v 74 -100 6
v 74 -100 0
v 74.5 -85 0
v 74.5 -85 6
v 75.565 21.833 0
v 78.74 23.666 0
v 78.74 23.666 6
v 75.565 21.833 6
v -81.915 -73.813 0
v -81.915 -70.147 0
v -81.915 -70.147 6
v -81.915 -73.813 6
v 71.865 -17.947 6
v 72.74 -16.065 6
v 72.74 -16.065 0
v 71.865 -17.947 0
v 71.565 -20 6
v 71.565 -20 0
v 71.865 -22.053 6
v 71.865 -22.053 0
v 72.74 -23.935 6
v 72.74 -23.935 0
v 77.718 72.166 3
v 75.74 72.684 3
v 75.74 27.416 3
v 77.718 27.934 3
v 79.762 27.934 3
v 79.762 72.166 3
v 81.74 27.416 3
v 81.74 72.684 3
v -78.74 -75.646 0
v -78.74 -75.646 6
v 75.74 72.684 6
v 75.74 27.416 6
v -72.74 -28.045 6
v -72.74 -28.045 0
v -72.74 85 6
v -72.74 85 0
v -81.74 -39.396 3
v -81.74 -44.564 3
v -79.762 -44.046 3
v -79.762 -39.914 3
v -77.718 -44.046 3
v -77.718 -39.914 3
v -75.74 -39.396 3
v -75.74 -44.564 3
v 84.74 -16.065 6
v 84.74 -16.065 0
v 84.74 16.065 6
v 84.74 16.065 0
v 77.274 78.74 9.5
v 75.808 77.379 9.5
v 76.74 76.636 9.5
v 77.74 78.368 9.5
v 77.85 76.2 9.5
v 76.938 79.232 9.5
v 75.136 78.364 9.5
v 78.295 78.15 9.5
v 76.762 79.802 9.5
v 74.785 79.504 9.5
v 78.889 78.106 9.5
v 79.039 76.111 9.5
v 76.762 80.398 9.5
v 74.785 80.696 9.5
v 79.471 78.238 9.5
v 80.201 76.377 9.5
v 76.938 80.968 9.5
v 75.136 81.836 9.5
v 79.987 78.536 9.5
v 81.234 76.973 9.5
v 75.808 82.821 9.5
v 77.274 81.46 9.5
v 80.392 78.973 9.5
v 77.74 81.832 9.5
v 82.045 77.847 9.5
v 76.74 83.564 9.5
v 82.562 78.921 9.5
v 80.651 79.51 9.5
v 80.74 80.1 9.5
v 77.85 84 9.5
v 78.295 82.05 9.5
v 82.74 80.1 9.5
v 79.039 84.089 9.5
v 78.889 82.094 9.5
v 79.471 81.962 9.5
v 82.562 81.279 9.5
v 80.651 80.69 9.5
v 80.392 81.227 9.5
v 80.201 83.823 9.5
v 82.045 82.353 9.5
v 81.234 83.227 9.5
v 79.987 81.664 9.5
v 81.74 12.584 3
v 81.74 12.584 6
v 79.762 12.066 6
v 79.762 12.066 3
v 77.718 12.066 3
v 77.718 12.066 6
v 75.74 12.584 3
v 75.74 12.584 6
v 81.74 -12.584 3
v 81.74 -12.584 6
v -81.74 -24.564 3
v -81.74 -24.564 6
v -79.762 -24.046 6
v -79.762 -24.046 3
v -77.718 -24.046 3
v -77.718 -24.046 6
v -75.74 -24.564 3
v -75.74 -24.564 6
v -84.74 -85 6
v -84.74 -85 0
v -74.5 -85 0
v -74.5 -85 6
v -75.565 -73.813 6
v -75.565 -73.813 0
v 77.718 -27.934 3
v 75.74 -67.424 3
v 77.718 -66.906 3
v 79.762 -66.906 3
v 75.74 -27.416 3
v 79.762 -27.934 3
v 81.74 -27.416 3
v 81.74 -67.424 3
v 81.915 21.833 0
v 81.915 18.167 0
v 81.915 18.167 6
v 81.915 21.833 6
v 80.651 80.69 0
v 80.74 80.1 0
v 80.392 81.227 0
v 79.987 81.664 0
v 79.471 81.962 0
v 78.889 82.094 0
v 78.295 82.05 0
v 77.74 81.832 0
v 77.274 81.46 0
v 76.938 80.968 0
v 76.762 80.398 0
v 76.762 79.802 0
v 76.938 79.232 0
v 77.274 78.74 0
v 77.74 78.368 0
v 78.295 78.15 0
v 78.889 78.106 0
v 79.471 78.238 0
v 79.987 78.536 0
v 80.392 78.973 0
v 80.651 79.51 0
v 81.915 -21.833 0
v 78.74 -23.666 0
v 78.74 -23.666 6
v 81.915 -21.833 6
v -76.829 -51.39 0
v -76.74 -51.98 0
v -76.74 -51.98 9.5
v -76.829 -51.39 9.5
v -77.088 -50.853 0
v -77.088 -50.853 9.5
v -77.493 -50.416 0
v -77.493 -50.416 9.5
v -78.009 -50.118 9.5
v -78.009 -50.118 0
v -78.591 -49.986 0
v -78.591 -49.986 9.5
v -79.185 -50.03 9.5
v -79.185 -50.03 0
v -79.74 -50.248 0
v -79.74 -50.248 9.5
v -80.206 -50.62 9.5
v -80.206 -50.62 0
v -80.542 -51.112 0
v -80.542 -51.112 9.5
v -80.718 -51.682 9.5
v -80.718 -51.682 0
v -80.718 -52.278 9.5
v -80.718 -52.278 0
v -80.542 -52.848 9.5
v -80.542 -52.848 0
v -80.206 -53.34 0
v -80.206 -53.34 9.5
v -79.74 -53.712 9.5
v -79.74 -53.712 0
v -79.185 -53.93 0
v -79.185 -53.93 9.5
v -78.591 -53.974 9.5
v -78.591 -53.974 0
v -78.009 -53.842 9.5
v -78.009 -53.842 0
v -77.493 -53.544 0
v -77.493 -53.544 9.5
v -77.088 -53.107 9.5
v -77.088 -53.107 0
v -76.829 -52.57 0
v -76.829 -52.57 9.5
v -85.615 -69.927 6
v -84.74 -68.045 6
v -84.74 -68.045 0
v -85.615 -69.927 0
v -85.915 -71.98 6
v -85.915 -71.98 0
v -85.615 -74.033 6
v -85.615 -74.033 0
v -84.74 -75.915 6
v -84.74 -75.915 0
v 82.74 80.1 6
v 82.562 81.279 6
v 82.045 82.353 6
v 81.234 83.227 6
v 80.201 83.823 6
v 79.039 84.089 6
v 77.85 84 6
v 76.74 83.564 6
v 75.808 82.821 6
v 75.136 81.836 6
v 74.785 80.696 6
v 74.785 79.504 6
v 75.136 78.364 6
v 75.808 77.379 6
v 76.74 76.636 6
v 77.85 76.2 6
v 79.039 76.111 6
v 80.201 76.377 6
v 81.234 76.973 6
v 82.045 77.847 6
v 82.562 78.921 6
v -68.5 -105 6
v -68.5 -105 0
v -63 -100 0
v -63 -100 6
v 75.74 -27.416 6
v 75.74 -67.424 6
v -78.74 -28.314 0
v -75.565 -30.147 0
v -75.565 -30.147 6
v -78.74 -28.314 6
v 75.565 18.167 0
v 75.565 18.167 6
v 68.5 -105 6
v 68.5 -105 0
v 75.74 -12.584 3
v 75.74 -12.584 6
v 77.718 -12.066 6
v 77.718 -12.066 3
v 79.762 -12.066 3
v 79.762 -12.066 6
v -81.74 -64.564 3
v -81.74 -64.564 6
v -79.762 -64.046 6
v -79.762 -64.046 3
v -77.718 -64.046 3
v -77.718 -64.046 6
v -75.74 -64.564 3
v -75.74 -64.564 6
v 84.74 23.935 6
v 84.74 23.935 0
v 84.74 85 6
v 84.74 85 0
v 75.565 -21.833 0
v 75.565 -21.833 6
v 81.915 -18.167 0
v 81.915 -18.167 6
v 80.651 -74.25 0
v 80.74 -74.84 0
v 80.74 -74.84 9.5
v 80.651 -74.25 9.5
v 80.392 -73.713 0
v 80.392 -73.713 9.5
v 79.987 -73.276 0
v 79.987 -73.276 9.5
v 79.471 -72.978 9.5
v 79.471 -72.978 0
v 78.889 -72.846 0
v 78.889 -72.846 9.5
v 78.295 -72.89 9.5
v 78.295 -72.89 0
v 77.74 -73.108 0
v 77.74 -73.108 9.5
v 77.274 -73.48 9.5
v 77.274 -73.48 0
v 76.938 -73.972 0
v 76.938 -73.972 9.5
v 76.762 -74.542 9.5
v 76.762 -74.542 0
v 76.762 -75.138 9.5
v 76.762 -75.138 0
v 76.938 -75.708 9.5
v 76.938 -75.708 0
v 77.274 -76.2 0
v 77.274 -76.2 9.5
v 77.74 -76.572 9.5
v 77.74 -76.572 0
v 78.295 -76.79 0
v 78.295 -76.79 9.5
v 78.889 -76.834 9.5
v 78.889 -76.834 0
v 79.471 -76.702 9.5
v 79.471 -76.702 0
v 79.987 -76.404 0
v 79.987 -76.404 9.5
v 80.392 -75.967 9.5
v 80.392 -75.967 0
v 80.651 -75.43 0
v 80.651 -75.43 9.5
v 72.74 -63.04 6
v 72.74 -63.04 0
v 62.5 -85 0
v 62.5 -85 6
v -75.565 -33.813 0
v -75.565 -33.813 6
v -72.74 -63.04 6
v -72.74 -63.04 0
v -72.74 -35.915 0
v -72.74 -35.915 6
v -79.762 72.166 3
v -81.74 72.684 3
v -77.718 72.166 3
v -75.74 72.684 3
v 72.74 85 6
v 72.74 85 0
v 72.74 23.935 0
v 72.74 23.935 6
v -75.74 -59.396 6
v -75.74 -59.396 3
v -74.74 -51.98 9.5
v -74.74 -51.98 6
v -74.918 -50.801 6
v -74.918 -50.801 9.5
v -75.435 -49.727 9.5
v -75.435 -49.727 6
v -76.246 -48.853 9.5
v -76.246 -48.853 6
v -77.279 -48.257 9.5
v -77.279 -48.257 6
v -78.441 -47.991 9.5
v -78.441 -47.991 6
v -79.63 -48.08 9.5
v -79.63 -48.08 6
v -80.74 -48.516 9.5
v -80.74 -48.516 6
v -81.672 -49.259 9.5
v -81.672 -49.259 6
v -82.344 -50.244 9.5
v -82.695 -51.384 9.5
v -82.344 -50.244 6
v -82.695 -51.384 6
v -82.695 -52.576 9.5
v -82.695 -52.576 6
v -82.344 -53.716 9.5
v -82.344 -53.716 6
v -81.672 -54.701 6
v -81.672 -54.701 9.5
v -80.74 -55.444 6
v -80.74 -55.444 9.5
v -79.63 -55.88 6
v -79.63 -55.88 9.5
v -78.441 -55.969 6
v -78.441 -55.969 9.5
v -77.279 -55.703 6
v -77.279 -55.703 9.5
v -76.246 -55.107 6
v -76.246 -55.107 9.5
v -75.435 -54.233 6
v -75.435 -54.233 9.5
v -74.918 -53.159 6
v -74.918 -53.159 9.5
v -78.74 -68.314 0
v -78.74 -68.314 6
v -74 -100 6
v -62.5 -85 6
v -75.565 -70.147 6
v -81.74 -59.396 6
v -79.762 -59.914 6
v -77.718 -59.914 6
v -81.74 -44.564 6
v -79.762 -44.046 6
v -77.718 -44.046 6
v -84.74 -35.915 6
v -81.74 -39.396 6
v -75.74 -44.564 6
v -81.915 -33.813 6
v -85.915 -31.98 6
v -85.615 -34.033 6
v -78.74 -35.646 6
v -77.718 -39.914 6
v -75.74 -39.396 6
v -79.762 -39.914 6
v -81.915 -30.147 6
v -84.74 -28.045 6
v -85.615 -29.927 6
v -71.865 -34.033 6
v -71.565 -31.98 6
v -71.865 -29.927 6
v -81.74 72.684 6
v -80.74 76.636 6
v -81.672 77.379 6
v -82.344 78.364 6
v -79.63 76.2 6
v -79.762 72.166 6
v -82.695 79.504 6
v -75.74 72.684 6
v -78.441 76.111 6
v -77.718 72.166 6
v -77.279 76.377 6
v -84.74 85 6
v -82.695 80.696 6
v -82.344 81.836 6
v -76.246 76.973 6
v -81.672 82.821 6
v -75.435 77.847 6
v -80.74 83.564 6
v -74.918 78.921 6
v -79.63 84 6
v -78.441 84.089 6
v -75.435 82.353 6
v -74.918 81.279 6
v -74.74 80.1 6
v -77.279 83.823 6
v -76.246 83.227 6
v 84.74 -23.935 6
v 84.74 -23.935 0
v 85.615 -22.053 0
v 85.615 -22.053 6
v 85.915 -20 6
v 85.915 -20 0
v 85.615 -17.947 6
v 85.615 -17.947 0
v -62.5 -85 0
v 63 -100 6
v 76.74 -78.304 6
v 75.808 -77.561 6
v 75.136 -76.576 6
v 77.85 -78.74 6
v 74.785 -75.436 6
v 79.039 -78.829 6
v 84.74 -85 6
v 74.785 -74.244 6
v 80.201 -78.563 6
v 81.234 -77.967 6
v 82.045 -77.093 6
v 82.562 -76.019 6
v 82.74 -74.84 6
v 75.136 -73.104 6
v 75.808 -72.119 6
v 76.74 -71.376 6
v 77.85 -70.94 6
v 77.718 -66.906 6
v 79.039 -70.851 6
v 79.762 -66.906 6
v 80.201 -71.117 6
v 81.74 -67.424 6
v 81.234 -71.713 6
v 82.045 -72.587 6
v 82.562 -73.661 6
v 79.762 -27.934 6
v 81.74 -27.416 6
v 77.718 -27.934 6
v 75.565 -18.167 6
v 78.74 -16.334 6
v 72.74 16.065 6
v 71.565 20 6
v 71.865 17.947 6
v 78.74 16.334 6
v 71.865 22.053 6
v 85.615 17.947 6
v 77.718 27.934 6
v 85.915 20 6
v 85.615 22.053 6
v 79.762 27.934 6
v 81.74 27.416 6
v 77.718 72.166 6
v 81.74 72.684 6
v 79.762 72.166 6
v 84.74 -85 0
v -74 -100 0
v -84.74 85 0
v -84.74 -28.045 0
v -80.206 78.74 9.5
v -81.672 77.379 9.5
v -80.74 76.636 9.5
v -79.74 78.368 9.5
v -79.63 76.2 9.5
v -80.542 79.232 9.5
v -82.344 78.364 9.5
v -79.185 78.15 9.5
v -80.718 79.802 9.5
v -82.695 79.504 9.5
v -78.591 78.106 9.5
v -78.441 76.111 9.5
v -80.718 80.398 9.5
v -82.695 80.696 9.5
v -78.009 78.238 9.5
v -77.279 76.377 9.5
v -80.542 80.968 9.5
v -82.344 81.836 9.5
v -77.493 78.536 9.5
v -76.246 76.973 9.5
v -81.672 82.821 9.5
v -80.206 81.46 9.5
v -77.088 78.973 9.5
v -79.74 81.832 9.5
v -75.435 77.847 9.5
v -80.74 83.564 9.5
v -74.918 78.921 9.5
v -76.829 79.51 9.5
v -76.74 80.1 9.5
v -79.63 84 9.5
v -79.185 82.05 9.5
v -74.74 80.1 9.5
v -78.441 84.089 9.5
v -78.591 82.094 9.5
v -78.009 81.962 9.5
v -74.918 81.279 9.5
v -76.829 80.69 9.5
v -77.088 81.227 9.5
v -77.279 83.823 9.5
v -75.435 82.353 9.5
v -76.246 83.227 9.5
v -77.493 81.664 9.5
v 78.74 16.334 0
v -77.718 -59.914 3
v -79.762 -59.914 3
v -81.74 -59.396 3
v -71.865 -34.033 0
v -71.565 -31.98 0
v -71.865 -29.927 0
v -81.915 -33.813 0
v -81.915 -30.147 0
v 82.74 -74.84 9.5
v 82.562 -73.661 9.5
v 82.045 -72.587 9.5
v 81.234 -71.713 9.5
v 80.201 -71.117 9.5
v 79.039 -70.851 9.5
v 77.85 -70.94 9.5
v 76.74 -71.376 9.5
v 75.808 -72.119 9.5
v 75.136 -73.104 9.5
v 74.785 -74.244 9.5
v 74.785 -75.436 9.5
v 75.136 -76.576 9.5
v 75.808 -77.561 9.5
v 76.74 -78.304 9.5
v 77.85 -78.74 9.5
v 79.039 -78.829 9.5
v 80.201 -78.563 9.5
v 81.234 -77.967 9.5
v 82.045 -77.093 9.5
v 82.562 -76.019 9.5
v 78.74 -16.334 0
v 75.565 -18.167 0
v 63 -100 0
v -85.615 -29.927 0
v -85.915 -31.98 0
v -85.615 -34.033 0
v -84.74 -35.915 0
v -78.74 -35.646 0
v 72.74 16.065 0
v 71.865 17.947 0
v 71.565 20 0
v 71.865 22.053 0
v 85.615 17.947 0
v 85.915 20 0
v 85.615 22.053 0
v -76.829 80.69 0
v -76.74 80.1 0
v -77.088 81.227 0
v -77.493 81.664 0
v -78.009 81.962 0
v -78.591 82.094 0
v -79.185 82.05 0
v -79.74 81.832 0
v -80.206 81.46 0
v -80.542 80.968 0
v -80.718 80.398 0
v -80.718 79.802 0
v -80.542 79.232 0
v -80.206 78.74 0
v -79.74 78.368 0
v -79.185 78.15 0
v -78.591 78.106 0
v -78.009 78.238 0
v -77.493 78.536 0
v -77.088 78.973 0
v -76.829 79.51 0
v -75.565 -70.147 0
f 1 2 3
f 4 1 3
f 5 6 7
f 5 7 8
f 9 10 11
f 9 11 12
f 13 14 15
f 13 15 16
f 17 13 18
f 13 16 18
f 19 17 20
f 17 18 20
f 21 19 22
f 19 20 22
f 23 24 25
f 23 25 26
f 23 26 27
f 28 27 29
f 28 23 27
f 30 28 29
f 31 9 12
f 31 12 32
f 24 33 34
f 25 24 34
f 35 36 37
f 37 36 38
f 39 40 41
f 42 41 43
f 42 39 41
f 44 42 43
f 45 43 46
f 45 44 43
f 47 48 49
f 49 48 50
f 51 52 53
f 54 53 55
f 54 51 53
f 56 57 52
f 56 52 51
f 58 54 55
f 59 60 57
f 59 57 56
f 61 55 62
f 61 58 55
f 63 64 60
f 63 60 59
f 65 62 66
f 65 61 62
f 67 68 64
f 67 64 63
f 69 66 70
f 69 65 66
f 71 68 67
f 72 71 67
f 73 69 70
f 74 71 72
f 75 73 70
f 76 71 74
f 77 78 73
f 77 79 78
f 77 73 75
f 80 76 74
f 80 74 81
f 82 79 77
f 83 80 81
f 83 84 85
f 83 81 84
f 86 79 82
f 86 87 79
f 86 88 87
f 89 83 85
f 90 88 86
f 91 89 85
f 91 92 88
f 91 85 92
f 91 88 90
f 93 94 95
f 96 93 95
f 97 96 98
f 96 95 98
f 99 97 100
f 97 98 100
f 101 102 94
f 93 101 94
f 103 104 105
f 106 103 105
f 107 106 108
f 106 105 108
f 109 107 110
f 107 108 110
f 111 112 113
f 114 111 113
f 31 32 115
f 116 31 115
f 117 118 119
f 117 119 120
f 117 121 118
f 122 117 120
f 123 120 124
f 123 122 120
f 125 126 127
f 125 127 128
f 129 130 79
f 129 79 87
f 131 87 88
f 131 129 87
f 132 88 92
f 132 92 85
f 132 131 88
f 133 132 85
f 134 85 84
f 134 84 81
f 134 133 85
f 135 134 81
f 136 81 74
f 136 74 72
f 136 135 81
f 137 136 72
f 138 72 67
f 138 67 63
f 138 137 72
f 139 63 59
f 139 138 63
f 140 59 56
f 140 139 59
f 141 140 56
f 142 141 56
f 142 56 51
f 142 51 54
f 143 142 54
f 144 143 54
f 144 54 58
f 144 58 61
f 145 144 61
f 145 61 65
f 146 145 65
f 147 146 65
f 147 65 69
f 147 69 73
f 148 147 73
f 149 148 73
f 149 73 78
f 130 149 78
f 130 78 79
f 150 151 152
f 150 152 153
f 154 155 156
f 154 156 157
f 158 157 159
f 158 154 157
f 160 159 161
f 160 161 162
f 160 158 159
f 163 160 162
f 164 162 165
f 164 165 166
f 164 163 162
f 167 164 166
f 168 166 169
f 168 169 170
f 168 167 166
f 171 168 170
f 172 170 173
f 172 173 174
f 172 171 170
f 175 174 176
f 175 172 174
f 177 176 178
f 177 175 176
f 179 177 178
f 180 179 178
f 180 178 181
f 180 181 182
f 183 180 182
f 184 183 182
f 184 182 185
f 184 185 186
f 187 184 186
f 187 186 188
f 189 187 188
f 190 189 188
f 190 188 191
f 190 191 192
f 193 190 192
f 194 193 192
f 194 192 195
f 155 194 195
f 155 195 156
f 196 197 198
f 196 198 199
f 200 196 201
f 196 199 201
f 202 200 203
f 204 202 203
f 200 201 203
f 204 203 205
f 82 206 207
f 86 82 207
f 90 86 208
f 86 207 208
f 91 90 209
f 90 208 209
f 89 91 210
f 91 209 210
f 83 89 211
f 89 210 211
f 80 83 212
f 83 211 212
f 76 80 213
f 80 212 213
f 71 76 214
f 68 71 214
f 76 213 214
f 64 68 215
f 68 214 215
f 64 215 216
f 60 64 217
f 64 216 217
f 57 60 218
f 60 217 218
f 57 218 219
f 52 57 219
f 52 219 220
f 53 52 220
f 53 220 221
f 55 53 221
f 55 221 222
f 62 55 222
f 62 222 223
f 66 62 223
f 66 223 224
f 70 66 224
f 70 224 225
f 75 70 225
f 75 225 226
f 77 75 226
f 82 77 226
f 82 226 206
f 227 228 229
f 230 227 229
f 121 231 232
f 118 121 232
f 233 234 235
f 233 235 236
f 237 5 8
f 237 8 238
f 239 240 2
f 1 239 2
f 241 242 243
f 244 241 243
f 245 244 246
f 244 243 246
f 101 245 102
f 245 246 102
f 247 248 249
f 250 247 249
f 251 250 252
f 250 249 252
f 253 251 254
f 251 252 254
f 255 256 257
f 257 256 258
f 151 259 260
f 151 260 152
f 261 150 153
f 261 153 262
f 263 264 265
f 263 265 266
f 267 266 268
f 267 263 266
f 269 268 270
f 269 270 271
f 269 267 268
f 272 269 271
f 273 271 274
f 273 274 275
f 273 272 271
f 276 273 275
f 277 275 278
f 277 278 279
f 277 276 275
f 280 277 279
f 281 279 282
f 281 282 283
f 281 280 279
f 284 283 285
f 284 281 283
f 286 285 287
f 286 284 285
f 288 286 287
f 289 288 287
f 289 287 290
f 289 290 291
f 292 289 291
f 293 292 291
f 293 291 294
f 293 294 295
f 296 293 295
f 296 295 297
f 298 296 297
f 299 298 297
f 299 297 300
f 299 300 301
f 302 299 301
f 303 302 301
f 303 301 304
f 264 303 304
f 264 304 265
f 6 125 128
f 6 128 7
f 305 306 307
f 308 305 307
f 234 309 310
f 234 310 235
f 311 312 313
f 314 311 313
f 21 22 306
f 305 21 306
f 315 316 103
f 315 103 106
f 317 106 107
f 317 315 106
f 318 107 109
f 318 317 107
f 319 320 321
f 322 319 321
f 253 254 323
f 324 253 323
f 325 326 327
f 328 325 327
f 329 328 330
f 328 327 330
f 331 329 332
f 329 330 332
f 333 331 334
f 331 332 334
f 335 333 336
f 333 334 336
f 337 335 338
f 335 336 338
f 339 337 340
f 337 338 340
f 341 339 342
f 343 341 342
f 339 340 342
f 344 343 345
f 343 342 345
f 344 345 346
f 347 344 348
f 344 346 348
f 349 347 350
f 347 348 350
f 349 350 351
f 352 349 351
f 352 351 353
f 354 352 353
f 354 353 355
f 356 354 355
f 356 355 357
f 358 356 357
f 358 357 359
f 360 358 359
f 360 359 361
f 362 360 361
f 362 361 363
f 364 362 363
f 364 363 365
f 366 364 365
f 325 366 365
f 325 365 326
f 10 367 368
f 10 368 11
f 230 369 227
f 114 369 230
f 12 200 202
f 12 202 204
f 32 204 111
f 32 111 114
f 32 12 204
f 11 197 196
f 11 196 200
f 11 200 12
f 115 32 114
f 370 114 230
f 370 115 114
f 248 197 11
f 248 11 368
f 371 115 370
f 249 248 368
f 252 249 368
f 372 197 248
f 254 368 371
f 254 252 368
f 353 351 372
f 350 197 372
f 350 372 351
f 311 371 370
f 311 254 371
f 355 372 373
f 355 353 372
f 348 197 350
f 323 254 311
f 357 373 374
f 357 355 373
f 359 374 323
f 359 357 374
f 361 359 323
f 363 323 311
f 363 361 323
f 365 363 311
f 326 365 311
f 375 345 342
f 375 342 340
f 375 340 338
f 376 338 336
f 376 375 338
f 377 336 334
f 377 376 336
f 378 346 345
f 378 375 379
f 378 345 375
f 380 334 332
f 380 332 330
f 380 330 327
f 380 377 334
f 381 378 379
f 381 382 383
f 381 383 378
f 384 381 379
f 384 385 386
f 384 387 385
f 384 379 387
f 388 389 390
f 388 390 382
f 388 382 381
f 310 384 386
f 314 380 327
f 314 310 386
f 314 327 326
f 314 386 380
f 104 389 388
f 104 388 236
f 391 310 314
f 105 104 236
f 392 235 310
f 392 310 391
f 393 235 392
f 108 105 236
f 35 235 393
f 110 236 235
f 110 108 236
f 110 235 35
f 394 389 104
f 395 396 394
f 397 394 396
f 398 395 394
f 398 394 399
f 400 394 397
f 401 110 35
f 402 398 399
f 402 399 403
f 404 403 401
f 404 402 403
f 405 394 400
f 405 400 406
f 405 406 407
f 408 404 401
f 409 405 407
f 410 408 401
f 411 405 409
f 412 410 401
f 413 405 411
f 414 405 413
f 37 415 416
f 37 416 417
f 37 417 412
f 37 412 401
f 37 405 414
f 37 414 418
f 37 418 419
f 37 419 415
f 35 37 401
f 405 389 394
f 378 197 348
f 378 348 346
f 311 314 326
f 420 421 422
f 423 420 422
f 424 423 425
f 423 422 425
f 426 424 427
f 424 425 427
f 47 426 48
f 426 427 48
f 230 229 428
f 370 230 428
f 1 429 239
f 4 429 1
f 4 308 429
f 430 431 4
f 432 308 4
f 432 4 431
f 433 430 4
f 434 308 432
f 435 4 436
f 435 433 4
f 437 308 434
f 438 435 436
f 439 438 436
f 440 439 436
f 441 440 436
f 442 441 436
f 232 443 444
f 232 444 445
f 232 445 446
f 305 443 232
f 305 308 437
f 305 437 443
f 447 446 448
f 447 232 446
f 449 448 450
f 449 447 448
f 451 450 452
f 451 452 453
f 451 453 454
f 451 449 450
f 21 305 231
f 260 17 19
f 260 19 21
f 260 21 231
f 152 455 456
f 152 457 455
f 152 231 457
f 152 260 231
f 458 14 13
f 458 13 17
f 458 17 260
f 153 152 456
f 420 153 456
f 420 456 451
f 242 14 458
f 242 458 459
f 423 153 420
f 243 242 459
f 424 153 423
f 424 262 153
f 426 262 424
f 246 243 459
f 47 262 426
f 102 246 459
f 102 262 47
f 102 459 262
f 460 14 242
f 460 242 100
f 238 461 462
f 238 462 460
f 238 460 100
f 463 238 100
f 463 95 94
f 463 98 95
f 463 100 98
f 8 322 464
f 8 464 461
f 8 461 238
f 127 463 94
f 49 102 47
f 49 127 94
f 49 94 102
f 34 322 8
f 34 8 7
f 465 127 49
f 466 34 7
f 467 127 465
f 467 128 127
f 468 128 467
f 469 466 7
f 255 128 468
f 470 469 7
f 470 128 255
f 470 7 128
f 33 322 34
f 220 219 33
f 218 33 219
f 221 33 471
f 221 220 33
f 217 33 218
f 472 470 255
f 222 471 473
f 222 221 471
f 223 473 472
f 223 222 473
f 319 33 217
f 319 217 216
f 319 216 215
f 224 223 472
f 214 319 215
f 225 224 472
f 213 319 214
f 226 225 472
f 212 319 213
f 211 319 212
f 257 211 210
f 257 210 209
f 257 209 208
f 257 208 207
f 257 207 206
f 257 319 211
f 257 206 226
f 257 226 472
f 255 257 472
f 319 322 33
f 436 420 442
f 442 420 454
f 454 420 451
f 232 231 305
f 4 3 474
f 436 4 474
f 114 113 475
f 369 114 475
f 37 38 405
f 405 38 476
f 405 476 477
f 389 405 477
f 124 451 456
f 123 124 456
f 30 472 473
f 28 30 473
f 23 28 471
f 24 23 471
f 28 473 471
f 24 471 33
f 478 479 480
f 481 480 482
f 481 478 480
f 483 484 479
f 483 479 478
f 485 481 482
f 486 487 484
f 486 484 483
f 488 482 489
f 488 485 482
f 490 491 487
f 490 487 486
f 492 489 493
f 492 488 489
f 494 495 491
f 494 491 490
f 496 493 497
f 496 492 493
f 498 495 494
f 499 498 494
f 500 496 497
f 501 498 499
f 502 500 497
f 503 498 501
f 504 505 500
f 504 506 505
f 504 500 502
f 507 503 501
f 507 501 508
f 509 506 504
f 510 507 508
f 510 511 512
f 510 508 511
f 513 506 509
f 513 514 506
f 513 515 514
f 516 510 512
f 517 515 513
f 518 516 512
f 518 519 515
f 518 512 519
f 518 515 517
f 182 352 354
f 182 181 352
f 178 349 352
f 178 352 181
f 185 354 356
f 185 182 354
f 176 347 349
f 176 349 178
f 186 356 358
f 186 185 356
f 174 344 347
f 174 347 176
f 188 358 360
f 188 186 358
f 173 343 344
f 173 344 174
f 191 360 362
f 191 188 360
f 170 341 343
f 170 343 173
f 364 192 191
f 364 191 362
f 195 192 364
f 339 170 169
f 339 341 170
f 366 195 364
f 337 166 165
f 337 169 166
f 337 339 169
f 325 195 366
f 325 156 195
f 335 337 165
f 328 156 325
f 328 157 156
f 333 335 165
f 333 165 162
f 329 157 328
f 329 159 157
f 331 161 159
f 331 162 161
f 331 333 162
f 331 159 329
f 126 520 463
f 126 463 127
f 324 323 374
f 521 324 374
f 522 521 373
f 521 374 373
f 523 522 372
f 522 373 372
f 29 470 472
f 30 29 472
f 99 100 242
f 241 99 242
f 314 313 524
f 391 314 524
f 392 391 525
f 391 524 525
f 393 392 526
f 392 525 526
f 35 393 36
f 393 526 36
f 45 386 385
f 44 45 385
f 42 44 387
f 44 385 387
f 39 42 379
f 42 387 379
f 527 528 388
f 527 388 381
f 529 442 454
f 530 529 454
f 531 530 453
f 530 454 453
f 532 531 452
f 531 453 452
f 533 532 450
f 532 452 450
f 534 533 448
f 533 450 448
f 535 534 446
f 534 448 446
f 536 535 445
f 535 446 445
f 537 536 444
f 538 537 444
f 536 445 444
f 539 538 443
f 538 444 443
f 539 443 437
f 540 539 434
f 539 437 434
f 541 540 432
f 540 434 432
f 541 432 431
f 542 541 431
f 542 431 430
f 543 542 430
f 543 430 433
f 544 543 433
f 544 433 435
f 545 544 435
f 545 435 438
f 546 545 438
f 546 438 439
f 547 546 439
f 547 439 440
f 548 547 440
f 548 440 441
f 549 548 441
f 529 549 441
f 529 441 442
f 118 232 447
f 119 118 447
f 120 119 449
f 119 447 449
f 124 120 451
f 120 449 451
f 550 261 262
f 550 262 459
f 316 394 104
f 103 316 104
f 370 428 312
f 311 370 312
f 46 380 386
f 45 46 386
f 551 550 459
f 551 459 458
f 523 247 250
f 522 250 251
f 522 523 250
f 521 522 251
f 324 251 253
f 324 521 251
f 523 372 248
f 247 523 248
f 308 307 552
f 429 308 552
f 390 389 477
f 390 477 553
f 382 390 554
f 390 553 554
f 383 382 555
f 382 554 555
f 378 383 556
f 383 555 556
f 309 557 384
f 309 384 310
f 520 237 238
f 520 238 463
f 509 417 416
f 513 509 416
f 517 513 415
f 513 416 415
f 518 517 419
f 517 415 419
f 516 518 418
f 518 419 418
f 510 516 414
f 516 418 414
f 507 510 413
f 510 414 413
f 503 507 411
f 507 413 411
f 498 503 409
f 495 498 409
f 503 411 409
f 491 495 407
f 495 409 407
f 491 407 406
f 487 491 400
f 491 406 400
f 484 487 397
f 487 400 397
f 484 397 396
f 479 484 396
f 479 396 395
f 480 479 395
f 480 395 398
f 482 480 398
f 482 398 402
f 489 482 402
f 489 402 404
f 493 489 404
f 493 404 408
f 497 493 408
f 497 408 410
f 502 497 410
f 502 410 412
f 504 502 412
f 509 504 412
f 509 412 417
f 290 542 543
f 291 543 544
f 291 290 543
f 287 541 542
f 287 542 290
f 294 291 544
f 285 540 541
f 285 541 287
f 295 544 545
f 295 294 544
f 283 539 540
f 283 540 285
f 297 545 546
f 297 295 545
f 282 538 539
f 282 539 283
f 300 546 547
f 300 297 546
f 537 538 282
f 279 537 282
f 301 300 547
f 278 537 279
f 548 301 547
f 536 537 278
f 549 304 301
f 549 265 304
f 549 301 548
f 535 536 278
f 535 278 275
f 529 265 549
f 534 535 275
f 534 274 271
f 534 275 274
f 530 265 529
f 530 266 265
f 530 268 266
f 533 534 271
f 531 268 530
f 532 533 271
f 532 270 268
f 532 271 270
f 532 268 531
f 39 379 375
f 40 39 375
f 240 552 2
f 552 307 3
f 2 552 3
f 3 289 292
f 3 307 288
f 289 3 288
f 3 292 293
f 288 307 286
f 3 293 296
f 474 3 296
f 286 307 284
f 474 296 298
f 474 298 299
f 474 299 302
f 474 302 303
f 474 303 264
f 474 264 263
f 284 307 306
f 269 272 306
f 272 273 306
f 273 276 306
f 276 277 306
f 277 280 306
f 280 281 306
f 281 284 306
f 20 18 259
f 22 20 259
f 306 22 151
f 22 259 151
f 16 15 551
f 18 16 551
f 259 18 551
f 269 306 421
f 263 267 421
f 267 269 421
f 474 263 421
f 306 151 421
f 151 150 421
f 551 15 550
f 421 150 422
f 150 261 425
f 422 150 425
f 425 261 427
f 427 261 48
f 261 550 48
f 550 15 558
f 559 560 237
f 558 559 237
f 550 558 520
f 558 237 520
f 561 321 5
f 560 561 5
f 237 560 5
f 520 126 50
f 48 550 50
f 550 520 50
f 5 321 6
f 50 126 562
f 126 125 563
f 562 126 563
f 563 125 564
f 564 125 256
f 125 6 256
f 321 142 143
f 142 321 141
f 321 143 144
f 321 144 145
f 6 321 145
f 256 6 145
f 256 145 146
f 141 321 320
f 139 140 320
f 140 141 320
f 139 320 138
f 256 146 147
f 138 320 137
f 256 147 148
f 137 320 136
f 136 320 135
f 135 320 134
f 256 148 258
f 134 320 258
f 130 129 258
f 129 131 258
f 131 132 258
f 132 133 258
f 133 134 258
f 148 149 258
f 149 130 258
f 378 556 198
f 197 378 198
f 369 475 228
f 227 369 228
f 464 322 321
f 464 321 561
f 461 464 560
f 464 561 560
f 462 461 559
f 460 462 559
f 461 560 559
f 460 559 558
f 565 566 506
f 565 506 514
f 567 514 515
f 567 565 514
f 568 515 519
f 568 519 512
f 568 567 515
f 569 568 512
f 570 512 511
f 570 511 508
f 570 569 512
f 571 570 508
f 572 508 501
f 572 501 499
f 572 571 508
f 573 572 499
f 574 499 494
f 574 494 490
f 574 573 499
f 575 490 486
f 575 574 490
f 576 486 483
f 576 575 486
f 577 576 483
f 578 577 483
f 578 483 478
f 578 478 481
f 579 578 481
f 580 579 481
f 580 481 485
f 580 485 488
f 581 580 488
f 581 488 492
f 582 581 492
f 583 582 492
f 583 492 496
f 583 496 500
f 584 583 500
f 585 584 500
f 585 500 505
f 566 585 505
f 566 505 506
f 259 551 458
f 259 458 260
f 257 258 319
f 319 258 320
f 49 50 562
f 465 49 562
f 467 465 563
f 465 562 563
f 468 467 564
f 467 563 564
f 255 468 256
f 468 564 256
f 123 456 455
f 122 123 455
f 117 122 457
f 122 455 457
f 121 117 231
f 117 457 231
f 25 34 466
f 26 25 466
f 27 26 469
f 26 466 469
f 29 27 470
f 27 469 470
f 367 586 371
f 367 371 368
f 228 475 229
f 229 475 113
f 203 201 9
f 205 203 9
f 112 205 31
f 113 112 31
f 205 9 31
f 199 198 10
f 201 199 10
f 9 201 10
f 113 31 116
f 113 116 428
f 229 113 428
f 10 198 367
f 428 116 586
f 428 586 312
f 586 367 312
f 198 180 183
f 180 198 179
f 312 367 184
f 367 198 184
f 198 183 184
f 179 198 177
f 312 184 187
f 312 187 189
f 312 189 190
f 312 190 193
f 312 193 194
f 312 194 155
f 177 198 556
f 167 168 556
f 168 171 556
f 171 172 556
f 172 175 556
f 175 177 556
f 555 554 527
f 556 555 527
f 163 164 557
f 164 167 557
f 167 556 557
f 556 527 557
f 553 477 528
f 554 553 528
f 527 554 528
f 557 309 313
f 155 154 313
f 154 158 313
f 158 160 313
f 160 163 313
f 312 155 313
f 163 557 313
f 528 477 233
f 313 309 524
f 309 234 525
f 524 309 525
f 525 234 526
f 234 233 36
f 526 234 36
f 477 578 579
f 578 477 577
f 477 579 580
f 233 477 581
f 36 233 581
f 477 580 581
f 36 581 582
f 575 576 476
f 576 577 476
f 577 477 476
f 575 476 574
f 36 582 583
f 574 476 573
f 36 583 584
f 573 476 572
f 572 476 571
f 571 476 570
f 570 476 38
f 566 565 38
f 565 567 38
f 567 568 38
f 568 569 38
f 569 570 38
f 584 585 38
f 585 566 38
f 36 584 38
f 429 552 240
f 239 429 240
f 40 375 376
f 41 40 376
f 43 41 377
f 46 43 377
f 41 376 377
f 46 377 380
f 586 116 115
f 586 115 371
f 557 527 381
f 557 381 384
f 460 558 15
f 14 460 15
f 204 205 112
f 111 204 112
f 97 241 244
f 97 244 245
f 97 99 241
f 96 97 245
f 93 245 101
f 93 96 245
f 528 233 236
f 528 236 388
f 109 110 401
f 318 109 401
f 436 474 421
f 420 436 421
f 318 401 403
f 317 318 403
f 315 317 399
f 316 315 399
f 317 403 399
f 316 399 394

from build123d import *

# Parameters (mm, degrees)
F0_R     = 2
F1_DEPTH = 6
F2_R     = 4
F2_R_2   = 2
F3_DEPTH = 9.5
F4_R     = 7.175
F5_DEPTH = 6
F6_DEPTH = 9.501
F8_DEPTH = 3


with BuildPart() as f1:
    # F0 (on Top) → F1 (new body)
    with BuildSketch(Plane.XY):
        Polygon((-84.74, 85), (-84.74, -85), (-74.5, -85), (-74, -100), (-68.5, -105), (-63, -100), (-62.5, -85), (-72.74, -63.040249), (-72.74, 85), align=None)
        with Locations((-78.74, -51.98)):
            Circle(F0_R, mode=Mode.SUBTRACT)
        with Locations((-78.74, 80.1)):
            Circle(F0_R, mode=Mode.SUBTRACT)
        Polygon((63, -100), (68.5, -105), (74, -100), (74.5, -85), (84.74, -85), (84.74, 85), (72.74, 85), (72.74, -63.040249), (62.5, -85), align=None)
        with Locations((78.74, -74.84)):
            Circle(F0_R, mode=Mode.SUBTRACT)
        with Locations((78.74, 80.1)):
            Circle(F0_R, mode=Mode.SUBTRACT)
    extrude(amount=F1_DEPTH)

    # F2 (on Top) → F3 (join)
    with BuildSketch(Plane.XY):
        with Locations((-78.74, -51.98)):
            Circle(F2_R)
        with Locations((-78.74, -51.98)):
            Circle(F2_R_2, mode=Mode.SUBTRACT)
        with Locations((-78.74, 80.1)):
            Circle(F2_R)
        with Locations((-78.74, 80.1)):
            Circle(F2_R_2, mode=Mode.SUBTRACT)
        with Locations((78.74, -74.84)):
            Circle(F2_R)
        with Locations((78.74, -74.84)):
            Circle(F2_R_2, mode=Mode.SUBTRACT)
        with Locations((78.74, 80.1)):
            Circle(F2_R)
        with Locations((78.74, 80.1)):
            Circle(F2_R_2, mode=Mode.SUBTRACT)
    extrude(amount=F3_DEPTH)

    # F4 (on Top) → F5 (join, through all)
    with BuildSketch(Plane.XY):
        with Locations((-78.74, -31.98)):
            Circle(F4_R)
        Polygon((-78.74, -28.313826), (-75.565, -30.146913), (-75.565, -33.813087), (-78.74, -35.646174), (-81.915, -33.813087), (-81.915, -30.146913), align=None, mode=Mode.SUBTRACT)
        with Locations((-78.74, -71.98)):
            Circle(F4_R)
        Polygon((-78.74, -68.313826), (-75.565, -70.146913), (-75.565, -73.813087), (-78.74, -75.646174), (-81.915, -73.813087), (-81.915, -70.146913), align=None, mode=Mode.SUBTRACT)
        with Locations((78.74, 20)):
            Circle(F4_R)
        Polygon((78.74, 23.666174), (81.915, 21.833087), (81.915, 18.166913), (78.74, 16.333826), (75.565, 18.166913), (75.565, 21.833087), align=None, mode=Mode.SUBTRACT)
        with Locations((78.74, -20)):
            Circle(F4_R)
        Polygon((78.74, -16.333826), (81.915, -18.166913), (81.915, -21.833087), (78.74, -23.666174), (75.565, -21.833087), (75.565, -18.166913), align=None, mode=Mode.SUBTRACT)
    extrude(amount=F5_DEPTH)

    # F4 (on Top) → F6 (cut, through all)
    with BuildSketch(Plane.XY):
        Polygon((-75.565, -33.813087), (-75.565, -30.146913), (-78.74, -28.313826), (-81.915, -30.146913), (-81.915, -33.813087), (-78.74, -35.646174), align=None)
        Polygon((-75.565, -73.813087), (-75.565, -70.146913), (-78.74, -68.313826), (-81.915, -70.146913), (-81.915, -73.813087), (-78.74, -75.646174), align=None)
        Polygon((81.915, -21.833087), (81.915, -18.166913), (78.74, -16.333826), (75.565, -18.166913), (75.565, -21.833087), (78.74, -23.666174), align=None)
        Polygon((81.915, 18.166913), (81.915, 21.833087), (78.74, 23.666174), (75.565, 21.833087), (75.565, 18.166913), (78.74, 16.333826), align=None)
    extrude(amount=F6_DEPTH, mode=Mode.SUBTRACT)

    # F7 (on face) → F8 (cut)
    with BuildSketch(Plane.XY.offset(6)):
        with BuildLine():
            ThreePointArc((-75.74, -39.396198), (-78.74, -39.98), (-81.74, -39.396198))
            Line((-81.74, -39.396198), (-81.74, -44.563802))
            ThreePointArc((-81.74, -44.563802), (-78.74, -43.98), (-75.74, -44.563802))
            Line((-75.74, -44.563802), (-75.74, -39.396198))
        make_face()
        with BuildLine():
            ThreePointArc((75.74, -12.583802), (78.74, -12), (81.74, -12.583802))
            Line((81.74, -12.583802), (81.74, 12.583802))
            ThreePointArc((81.74, 12.583802), (78.74, 12), (75.74, 12.583802))
            Line((75.74, 12.583802), (75.74, -12.583802))
        make_face()
        with BuildLine():
            ThreePointArc((-75.74, 72.683802), (-78.74, 72.1), (-81.74, 72.683802))
            Line((-81.74, 72.683802), (-81.74, -24.563802))
            ThreePointArc((-81.74, -24.563802), (-78.74, -23.98), (-75.74, -24.563802))
            Line((-75.74, -24.563802), (-75.74, 72.683802))
        make_face()
        with BuildLine():
            ThreePointArc((-75.74, -59.396198), (-78.74, -59.98), (-81.74, -59.396198))
            Line((-81.74, -59.396198), (-81.74, -64.563802))
            ThreePointArc((-81.74, -64.563802), (-78.74, -63.98), (-75.74, -64.563802))
            Line((-75.74, -64.563802), (-75.74, -59.396198))
        make_face()
        with BuildLine():
            ThreePointArc((81.74, 72.683802), (78.74, 72.1), (75.74, 72.683802))
            Line((75.74, 72.683802), (75.74, 27.416198))
            ThreePointArc((75.74, 27.416198), (78.74, 28), (81.74, 27.416198))
            Line((81.74, 27.416198), (81.74, 72.683802))
        make_face()
        with BuildLine():
            ThreePointArc((75.74, -67.423802), (78.74, -66.84), (81.74, -67.423802))
            Line((81.74, -67.423802), (81.74, -27.416198))
            ThreePointArc((81.74, -27.416198), (78.74, -28), (75.74, -27.416198))
            Line((75.74, -27.416198), (75.74, -67.423802))
        make_face()
    extrude(amount=-F8_DEPTH, mode=Mode.SUBTRACT)


solid = f1.part
